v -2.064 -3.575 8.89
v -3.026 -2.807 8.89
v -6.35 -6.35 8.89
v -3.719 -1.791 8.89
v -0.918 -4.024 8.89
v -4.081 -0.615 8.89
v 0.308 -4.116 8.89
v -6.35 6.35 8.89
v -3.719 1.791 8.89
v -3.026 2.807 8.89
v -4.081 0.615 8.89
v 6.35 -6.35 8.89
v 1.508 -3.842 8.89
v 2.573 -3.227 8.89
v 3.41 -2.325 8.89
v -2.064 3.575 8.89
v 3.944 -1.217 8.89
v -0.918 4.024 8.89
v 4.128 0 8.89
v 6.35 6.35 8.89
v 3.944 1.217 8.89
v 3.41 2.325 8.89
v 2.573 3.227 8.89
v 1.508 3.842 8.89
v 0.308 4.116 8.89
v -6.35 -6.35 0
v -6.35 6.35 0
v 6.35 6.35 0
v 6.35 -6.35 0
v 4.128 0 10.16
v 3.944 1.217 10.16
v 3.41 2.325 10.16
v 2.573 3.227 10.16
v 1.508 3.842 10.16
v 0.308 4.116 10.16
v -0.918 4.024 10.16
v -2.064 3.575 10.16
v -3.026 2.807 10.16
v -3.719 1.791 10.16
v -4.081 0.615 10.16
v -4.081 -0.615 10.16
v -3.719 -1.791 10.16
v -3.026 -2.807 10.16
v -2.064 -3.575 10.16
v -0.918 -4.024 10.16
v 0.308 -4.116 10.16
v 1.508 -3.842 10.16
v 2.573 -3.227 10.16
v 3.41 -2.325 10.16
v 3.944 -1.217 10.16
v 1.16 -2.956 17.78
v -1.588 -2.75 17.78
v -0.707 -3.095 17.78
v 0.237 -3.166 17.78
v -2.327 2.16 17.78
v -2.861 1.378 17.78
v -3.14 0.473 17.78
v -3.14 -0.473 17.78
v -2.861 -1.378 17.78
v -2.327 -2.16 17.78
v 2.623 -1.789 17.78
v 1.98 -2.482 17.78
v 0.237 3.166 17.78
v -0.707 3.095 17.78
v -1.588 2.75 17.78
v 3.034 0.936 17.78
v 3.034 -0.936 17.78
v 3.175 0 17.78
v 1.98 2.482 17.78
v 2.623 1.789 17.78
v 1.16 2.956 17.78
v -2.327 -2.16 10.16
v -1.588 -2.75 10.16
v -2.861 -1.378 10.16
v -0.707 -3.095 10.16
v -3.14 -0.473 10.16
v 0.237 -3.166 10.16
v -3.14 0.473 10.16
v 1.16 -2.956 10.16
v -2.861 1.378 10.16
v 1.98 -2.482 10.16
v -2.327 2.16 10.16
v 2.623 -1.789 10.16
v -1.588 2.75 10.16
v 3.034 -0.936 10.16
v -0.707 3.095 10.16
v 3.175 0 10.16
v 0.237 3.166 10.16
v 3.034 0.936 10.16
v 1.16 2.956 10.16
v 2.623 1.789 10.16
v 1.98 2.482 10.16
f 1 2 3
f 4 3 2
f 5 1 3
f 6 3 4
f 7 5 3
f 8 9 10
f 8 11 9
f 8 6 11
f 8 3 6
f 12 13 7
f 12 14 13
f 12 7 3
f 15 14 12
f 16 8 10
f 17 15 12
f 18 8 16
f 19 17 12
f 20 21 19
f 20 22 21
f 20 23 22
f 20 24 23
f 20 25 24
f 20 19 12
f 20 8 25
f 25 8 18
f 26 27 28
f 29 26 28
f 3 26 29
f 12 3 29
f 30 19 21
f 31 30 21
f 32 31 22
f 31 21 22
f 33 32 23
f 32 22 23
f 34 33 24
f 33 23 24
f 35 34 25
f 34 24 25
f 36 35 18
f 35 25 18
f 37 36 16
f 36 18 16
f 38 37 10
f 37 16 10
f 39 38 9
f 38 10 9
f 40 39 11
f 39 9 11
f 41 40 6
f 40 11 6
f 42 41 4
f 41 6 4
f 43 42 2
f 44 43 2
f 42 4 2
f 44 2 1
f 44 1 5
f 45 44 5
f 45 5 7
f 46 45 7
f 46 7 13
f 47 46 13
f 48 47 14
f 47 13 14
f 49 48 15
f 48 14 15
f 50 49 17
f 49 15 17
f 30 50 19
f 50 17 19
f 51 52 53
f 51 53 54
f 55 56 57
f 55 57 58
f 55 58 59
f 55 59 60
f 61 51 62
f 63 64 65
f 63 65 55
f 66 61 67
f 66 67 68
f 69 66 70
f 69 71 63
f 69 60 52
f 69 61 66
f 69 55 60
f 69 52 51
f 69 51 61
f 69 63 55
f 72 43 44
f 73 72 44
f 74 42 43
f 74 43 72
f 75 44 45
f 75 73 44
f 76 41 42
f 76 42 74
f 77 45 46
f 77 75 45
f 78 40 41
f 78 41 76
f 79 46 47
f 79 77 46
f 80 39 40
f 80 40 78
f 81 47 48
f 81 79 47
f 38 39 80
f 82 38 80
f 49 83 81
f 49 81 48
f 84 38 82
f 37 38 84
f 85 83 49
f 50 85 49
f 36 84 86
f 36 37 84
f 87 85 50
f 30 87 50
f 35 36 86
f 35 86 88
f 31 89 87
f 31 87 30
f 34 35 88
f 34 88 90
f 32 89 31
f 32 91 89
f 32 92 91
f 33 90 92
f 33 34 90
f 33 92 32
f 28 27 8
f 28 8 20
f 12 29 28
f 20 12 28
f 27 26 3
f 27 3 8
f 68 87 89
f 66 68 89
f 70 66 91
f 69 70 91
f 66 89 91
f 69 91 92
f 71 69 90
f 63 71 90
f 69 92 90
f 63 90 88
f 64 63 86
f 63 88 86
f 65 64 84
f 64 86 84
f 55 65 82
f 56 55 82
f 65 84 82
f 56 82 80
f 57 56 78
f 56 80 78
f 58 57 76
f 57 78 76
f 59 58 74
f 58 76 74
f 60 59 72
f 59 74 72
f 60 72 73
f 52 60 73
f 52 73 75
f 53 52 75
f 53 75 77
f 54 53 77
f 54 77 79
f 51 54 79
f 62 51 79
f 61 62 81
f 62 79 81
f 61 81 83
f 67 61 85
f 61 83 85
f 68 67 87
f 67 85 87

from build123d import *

# Parameters (mm, degrees)
F0_W     = 12.7
F0_H     = 12.7
F1_DEPTH = 8.89
F2_R     = 4.1275
F3_DEPTH = 1.27
F4_R     = 3.175
F5_DEPTH = 7.62


with BuildPart() as f1:
    # F0 (on Top) → F1 (new body)
    with BuildSketch(Plane.XY):
        Rectangle(F0_W, F0_H)
    extrude(amount=F1_DEPTH)

    # F2 (on face) → F3 (join)
    with BuildSketch(Plane.XY.offset(8.89)):
        Circle(F2_R)
    extrude(amount=F3_DEPTH)

    # F4 (on face) → F5 (join)
    with BuildSketch(Plane.XY.offset(10.16)):
        Circle(F4_R)
    extrude(amount=F5_DEPTH)


solid = f1.part
